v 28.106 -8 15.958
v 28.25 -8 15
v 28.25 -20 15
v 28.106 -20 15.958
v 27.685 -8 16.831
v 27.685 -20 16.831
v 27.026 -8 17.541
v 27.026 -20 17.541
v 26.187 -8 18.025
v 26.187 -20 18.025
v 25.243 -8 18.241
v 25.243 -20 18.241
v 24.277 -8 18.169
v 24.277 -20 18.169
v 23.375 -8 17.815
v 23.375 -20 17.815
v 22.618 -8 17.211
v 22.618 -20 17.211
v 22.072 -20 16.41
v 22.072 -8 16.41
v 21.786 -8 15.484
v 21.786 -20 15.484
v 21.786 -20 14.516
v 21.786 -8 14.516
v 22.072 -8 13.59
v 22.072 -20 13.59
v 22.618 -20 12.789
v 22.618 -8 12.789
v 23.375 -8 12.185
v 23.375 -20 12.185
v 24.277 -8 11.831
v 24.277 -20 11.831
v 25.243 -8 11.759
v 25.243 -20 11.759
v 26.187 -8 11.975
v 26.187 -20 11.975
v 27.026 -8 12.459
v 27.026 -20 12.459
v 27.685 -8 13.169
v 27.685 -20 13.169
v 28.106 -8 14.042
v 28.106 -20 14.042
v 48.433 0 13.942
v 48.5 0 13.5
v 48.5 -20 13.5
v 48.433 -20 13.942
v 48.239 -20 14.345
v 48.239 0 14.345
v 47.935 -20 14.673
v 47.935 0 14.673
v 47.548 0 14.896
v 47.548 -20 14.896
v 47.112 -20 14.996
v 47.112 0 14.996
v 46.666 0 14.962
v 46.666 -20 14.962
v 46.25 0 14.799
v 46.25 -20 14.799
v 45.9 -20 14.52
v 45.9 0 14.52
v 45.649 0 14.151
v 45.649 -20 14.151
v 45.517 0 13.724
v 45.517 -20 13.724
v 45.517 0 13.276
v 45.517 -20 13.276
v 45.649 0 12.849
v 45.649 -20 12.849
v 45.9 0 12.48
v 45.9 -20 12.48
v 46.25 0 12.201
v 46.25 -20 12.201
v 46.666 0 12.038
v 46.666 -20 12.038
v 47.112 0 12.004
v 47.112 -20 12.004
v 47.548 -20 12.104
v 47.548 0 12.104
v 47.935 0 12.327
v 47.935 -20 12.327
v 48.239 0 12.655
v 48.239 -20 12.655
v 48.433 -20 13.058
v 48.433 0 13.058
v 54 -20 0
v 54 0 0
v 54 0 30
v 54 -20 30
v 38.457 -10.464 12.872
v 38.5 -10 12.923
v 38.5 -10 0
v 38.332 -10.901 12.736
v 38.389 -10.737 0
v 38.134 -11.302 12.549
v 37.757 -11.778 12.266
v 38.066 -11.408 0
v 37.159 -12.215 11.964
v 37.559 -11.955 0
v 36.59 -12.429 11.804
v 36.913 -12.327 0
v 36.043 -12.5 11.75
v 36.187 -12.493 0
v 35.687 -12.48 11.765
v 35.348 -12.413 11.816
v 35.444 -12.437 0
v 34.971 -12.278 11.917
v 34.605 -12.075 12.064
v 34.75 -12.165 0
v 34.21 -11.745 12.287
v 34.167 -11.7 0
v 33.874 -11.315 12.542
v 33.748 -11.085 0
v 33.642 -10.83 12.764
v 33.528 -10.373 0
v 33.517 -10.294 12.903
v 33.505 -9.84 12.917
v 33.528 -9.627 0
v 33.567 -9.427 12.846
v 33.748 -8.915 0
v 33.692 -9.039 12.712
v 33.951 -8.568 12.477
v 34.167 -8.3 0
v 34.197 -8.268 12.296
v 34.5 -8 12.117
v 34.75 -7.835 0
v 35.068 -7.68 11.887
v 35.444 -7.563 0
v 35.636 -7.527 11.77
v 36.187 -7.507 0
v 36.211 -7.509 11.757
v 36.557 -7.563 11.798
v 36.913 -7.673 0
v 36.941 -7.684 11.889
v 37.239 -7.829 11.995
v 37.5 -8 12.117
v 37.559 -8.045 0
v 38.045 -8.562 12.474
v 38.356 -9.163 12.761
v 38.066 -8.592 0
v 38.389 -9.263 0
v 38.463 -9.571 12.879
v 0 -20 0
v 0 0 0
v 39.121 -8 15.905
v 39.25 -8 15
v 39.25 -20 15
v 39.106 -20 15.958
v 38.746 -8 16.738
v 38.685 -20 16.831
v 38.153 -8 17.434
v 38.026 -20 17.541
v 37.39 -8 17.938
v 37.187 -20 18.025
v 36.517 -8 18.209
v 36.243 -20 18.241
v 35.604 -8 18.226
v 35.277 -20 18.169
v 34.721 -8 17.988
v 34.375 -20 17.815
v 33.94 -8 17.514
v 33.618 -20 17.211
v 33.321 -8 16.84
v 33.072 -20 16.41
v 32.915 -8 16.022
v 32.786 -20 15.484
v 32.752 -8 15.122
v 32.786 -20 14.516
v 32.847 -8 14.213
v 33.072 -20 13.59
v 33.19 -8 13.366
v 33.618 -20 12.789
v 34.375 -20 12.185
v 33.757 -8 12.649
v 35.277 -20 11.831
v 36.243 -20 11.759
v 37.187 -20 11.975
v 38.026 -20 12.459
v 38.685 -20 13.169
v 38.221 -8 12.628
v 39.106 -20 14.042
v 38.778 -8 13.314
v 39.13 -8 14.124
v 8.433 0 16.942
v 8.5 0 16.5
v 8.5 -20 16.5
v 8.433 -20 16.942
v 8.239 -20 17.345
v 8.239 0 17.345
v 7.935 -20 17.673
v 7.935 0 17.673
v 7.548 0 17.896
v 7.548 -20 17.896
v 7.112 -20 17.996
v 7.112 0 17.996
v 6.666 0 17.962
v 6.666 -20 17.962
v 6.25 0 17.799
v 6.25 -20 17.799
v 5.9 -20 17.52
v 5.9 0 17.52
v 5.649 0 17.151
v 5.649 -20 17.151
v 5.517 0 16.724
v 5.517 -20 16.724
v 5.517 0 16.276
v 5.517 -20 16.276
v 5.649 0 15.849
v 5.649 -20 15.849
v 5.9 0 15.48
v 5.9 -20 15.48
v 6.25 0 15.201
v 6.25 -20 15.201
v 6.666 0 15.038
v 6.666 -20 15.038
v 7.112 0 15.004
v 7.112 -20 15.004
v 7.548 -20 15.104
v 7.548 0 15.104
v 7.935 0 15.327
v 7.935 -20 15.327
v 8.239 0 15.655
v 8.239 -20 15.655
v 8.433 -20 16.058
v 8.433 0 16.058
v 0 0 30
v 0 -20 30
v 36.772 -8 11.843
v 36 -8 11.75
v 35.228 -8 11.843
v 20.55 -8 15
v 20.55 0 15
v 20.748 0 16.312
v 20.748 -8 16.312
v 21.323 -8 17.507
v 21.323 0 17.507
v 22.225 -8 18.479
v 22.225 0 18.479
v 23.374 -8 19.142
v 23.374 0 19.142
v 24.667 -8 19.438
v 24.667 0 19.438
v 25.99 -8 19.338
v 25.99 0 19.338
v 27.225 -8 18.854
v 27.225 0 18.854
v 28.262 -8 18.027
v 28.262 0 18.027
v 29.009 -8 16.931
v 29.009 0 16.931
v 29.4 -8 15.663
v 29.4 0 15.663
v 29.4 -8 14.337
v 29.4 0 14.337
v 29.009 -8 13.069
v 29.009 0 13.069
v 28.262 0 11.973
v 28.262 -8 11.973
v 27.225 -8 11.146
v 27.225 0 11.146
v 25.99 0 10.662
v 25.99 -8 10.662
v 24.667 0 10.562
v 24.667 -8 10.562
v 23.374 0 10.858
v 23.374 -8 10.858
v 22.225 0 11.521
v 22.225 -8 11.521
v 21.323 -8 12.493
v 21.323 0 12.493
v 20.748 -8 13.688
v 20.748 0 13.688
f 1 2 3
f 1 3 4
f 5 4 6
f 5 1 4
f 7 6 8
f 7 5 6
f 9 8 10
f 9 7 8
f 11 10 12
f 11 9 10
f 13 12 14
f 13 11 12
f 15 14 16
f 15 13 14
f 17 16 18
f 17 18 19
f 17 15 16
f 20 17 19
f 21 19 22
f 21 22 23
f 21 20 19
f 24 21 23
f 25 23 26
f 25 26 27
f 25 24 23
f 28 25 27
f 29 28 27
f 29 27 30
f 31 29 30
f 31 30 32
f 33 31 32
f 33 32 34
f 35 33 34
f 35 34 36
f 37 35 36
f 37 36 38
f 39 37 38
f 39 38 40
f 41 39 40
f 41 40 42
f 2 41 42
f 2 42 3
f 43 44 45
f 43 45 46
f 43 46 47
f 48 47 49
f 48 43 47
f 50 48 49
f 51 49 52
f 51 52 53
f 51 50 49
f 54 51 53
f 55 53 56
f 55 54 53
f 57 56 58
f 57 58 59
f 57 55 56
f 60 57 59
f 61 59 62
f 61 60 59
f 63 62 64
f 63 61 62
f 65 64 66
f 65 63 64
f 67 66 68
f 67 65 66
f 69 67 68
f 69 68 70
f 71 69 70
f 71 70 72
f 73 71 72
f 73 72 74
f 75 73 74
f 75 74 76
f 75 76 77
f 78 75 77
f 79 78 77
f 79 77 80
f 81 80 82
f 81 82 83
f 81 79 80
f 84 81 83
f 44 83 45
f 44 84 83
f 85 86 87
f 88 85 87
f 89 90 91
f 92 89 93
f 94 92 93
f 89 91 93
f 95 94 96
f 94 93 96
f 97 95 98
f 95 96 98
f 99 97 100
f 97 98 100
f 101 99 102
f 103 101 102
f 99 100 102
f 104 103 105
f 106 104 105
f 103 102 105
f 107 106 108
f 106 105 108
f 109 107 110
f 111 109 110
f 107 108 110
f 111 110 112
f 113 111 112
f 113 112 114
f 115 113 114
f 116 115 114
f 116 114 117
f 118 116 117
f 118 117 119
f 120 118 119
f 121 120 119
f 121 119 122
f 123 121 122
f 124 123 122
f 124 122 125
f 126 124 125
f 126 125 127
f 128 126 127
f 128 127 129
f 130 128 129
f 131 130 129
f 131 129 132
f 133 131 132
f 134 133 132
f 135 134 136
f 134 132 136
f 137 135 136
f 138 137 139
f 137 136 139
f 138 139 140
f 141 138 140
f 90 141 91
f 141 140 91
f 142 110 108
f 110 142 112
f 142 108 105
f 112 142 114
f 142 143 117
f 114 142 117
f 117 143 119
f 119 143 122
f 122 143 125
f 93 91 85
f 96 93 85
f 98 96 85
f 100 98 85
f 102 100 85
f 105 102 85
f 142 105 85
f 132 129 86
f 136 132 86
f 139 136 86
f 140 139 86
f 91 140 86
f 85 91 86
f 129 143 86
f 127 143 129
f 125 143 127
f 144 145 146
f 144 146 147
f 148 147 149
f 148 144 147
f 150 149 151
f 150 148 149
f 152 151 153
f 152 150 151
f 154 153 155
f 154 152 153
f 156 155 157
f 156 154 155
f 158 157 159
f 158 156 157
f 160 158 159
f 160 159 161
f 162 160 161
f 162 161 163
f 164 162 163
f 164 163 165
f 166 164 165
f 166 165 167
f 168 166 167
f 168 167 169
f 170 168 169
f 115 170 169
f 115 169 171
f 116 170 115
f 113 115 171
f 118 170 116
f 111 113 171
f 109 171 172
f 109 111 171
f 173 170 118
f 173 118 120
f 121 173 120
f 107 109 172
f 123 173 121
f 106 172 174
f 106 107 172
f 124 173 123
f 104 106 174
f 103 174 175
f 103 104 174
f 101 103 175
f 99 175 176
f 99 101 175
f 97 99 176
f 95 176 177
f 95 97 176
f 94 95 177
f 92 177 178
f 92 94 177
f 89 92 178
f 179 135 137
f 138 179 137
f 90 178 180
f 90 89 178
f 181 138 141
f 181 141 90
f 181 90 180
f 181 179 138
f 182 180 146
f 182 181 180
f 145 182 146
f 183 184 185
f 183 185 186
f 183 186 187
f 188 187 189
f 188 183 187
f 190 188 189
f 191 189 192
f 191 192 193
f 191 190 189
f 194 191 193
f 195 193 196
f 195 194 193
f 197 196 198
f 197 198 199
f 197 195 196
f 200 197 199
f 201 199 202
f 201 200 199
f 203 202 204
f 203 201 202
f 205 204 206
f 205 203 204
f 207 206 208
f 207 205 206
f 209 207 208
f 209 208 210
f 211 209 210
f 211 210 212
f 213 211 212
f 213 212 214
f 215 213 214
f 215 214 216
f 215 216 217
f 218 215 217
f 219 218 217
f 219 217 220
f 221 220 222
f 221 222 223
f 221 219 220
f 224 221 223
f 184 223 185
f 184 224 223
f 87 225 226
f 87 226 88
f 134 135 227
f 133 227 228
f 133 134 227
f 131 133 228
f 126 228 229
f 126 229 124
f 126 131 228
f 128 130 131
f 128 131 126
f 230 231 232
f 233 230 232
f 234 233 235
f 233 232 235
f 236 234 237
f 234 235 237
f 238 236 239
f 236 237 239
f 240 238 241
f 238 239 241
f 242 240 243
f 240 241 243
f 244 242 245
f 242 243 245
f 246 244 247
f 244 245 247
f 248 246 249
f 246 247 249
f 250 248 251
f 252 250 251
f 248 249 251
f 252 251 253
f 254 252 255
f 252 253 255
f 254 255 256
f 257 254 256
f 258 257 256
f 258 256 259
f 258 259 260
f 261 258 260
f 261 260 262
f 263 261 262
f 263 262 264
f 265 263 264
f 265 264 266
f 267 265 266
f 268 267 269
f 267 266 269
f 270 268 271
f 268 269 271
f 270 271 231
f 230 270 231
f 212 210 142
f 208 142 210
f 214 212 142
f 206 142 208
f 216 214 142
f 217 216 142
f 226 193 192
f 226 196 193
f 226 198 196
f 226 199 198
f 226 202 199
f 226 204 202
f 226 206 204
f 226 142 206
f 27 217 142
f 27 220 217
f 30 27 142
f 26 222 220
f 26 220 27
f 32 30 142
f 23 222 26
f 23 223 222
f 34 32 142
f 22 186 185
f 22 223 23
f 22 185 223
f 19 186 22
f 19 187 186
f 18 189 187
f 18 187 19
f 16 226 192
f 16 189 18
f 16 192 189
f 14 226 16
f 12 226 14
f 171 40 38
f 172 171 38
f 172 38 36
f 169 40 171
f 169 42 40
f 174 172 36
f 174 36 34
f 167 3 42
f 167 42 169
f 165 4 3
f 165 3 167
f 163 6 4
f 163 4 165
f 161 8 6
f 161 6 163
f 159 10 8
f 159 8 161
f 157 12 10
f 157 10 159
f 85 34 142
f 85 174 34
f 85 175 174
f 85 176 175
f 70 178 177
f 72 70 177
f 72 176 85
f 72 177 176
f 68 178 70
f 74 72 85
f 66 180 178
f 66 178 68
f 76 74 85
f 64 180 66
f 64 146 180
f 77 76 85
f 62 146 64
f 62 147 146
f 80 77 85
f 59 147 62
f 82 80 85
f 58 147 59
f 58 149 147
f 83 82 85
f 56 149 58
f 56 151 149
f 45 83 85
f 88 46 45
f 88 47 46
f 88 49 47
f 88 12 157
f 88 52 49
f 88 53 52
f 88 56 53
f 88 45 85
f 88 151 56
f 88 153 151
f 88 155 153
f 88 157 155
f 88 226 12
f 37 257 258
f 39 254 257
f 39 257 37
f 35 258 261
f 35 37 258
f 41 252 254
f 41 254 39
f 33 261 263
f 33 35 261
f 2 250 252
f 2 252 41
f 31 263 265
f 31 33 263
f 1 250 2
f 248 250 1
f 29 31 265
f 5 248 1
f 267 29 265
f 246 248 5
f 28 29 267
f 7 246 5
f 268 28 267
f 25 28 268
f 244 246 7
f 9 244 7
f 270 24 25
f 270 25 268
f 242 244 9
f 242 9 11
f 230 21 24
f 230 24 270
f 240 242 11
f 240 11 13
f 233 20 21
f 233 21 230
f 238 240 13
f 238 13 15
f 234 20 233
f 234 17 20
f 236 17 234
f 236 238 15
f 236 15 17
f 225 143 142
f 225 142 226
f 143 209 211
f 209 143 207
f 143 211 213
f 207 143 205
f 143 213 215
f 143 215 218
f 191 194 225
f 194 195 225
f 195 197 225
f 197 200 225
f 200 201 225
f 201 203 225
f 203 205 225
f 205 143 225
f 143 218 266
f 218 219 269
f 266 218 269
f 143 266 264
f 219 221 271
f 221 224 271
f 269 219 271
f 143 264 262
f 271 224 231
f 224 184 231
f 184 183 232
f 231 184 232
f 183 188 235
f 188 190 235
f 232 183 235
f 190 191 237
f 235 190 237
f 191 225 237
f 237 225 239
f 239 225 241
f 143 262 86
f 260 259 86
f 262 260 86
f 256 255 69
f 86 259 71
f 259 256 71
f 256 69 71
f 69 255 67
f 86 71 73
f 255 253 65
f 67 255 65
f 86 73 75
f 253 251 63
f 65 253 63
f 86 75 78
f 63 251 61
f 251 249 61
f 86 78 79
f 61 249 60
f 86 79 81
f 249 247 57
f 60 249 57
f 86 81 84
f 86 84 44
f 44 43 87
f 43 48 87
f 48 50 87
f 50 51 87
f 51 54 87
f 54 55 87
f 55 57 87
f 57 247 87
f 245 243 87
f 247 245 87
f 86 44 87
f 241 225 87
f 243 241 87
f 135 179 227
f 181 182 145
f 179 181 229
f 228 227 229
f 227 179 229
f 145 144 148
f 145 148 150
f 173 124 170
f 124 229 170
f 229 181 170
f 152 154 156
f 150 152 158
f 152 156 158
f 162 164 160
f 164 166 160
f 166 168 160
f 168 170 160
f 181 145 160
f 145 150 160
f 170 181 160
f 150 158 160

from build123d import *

# Parameters (mm, degrees)
F0_W     = 54
F0_H     = 30
F0_R     = 1.5
F0_R_2   = 3.25
F1_DEPTH = 20
F3_R     = 2.5
F4_DEPTH = 16
F6_R     = 4.45
F7_DEPTH = 8
F5_R     = 3.25
F8_DEPTH = 8


with BuildPart() as f1:
    # F0 (on Front) → F1 (new body)
    with BuildSketch(Plane.XZ):
        with Locations((27, 15)):
            Rectangle(F0_W, F0_H)
        with Locations((47, 13.5)):
            Circle(F0_R, mode=Mode.SUBTRACT)
        with Locations((7, 16.5)):
            Circle(F0_R, mode=Mode.SUBTRACT)
        with Locations((25, 15)):
            Circle(F0_R_2, mode=Mode.SUBTRACT)
        with Locations((36, 15)):
            Circle(F0_R_2, mode=Mode.SUBTRACT)
    extrude(amount=F1_DEPTH)

    # F3 (on face) → F4 (cut)
    with BuildSketch(Plane(origin=(0, 0, 0), x_dir=(1, 0, 0), z_dir=(0, 0, -1))):
        with Locations((36, 10)):
            Circle(F3_R)
    extrude(amount=-F4_DEPTH, mode=Mode.SUBTRACT)

    # F6 (on face) → F7 (cut)
    with BuildSketch(Plane(origin=(0, 0, 0), x_dir=(-1, 0, 0), z_dir=(0, 1, 0))):
        with Locations((-25, 15)):
            Circle(F6_R)
    extrude(amount=-F7_DEPTH, mode=Mode.SUBTRACT)

    # F5 (on face) → F8 (join)
    with BuildSketch(Plane(origin=(0, 0, 0), x_dir=(-1, 0, 0), z_dir=(0, 1, 0))):
        with Locations((-36, 15)):
            Circle(F5_R)
    extrude(amount=-F8_DEPTH)


solid = f1.part
